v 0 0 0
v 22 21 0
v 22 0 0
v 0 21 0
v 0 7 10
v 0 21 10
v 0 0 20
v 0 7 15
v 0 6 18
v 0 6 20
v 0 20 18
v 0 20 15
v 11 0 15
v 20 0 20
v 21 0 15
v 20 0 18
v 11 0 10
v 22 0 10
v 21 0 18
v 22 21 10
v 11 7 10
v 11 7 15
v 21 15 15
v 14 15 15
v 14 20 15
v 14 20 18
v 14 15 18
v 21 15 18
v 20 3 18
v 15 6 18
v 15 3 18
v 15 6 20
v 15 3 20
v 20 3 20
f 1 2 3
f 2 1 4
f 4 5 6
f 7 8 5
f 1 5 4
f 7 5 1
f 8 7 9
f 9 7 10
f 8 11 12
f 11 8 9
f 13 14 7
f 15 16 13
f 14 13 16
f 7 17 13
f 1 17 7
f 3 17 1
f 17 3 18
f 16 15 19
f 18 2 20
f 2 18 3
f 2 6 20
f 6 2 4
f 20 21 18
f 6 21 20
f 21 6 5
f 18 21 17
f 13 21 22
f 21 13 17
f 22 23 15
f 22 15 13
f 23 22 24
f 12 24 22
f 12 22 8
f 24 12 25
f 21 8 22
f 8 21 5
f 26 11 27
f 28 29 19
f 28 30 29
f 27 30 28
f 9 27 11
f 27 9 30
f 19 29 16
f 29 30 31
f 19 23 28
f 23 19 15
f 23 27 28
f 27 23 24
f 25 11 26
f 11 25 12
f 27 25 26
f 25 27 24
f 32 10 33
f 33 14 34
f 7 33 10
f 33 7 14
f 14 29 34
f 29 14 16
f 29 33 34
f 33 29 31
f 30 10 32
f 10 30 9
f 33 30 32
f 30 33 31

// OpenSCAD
translate([5.5, 3.5, 2.5]) color([0.16567497287207977, 0.06388630911131887, 0.7015161675042403]) cube([11, 7, 5], center=true);
translate([16.5, 3.5, 2.5]) color([0.44636471217552665, 0.8849455079977631, 0.9080398571595916]) cube([11, 7, 5], center=true);
translate([5.5, 10.5, 2.5]) color([0.603977387811875, 6.916287448366365e-05, 0.03891018401520452]) cube([11, 7, 5], center=true);
translate([16.5, 10.5, 2.5]) color([0.3259439044599104, 0.8377368410445171, 0.049856996603651726]) cube([11, 7, 5], center=true);
translate([5.5, 17.5, 2.5]) color([0.8227199232206964, 0.9741768822998921, 0.41513741156459816]) cube([11, 7, 5], center=true);
translate([16.5, 17.5, 2.5]) color([0.5485620647625651, 0.9630377712330874, 0.9785717508455145]) cube([11, 7, 5], center=true);
translate([5.5, 3.5, 7.5]) color([0.8374483937438901, 0.13052175184206272, 0.014729286743825787]) cube([11, 7, 5], center=true);
translate([16.5, 3.5, 7.5]) color([0.9495475342759118, 0.4174850755645121, 0.003392809730206836]) cube([11, 7, 5], center=true);
translate([5.5, 10.5, 7.5]) color([0.014291314164728952, 0.7547538206156906, 0.9802446426654712]) cube([11, 7, 5], center=true);
translate([16.5, 10.5, 7.5]) color([0.6757618973280934, 0.6120619632138635, 0.19045993029254593]) cube([11, 7, 5], center=true);
translate([5.5, 17.5, 7.5]) color([0.6083596397136556, 0.19851637537519495, 0.30241604357944973]) cube([11, 7, 5], center=true);
translate([16.5, 17.5, 7.5]) color([0.6885400040337084, 0.1822211451841942, 0.4756054792846598]) cube([11, 7, 5], center=true);
translate([5.5, 3.5, 12.5]) color([0.9227697282783401, 0.6276391005616293, 0.021845499237729826]) cube([11, 7, 5], center=true);
translate([3.5, 2.5, 16.5]) color([0.9138811115397377, 0.7998245566512758, 0.11577939883887689]) cube([7, 5, 3], center=true);
translate([10.5, 2.5, 16.5]) color([0.25648877124056624, 0.6535669902031535, 0.8172732193081321]) cube([7, 5, 3], center=true);
translate([17.5, 2.5, 16.5]) color([0.644940669440128, 0.11510934585231414, 0.15444013683803237]) cube([7, 5, 3], center=true);
translate([3.5, 7.5, 16.5]) color([0.8512397484375114, 0.04229760200279409, 0.20573574066904754]) cube([7, 5, 3], center=true);
translate([10.5, 7.5, 16.5]) color([0.25966938255992333, 0.31471323182063216, 0.3668937976542025]) cube([7, 5, 3], center=true);
translate([17.5, 7.5, 16.5]) color([0.5674677931506273, 0.849437788441811, 0.8463599216128499]) cube([7, 5, 3], center=true);
translate([3.5, 12.5, 16.5]) color([0.9612029098073006, 0.6075964991402765, 0.49448567414550215]) cube([7, 5, 3], center=true);
translate([10.5, 12.5, 16.5]) color([0.6441434540056448, 0.45866436243162445, 0.4354406175944898]) cube([7, 5, 3], center=true);
translate([17.5, 12.5, 16.5]) color([0.8714107315087972, 0.17828831976535986, 0.3755789219373874]) cube([7, 5, 3], center=true);
translate([3.5, 17.5, 16.5]) color([0.2910354883141598, 0.1384569492267308, 0.27137343088841726]) cube([7, 5, 3], center=true);
translate([10.5, 17.5, 16.5]) color([0.3375110685052213, 0.3672014751918571, 0.09370751185905901]) cube([7, 5, 3], center=true);
translate([2.5, 1.5, 19.0]) color([0.7794169159273662, 0.03566546768846324, 0.26962214085355807]) cube([5, 3, 2], center=true);
translate([7.5, 1.5, 19.0]) color([0.14941603676910742, 0.583451176356754, 0.36090661134415847]) cube([5, 3, 2], center=true);
translate([12.5, 1.5, 19.0]) color([0.9893030267095886, 0.12964093903755392, 0.11489641277540219]) cube([5, 3, 2], center=true);
translate([17.5, 1.5, 19.0]) color([0.7305217328645741, 0.933754079403403, 0.30787976219942303]) cube([5, 3, 2], center=true);
translate([2.5, 4.5, 19.0]) color([0.8570365795720385, 0.7286607479368364, 0.3026706606385793]) cube([5, 3, 2], center=true);
translate([7.5, 4.5, 19.0]) color([0.8355597356596641, 0.2992255048060537, 0.1086514152541781]) cube([5, 3, 2], center=true);
translate([12.5, 4.5, 19.0]) color([0.5608299889315482, 0.4811722969562161, 0.3370805445376659]) cube([5, 3, 2], center=true);
